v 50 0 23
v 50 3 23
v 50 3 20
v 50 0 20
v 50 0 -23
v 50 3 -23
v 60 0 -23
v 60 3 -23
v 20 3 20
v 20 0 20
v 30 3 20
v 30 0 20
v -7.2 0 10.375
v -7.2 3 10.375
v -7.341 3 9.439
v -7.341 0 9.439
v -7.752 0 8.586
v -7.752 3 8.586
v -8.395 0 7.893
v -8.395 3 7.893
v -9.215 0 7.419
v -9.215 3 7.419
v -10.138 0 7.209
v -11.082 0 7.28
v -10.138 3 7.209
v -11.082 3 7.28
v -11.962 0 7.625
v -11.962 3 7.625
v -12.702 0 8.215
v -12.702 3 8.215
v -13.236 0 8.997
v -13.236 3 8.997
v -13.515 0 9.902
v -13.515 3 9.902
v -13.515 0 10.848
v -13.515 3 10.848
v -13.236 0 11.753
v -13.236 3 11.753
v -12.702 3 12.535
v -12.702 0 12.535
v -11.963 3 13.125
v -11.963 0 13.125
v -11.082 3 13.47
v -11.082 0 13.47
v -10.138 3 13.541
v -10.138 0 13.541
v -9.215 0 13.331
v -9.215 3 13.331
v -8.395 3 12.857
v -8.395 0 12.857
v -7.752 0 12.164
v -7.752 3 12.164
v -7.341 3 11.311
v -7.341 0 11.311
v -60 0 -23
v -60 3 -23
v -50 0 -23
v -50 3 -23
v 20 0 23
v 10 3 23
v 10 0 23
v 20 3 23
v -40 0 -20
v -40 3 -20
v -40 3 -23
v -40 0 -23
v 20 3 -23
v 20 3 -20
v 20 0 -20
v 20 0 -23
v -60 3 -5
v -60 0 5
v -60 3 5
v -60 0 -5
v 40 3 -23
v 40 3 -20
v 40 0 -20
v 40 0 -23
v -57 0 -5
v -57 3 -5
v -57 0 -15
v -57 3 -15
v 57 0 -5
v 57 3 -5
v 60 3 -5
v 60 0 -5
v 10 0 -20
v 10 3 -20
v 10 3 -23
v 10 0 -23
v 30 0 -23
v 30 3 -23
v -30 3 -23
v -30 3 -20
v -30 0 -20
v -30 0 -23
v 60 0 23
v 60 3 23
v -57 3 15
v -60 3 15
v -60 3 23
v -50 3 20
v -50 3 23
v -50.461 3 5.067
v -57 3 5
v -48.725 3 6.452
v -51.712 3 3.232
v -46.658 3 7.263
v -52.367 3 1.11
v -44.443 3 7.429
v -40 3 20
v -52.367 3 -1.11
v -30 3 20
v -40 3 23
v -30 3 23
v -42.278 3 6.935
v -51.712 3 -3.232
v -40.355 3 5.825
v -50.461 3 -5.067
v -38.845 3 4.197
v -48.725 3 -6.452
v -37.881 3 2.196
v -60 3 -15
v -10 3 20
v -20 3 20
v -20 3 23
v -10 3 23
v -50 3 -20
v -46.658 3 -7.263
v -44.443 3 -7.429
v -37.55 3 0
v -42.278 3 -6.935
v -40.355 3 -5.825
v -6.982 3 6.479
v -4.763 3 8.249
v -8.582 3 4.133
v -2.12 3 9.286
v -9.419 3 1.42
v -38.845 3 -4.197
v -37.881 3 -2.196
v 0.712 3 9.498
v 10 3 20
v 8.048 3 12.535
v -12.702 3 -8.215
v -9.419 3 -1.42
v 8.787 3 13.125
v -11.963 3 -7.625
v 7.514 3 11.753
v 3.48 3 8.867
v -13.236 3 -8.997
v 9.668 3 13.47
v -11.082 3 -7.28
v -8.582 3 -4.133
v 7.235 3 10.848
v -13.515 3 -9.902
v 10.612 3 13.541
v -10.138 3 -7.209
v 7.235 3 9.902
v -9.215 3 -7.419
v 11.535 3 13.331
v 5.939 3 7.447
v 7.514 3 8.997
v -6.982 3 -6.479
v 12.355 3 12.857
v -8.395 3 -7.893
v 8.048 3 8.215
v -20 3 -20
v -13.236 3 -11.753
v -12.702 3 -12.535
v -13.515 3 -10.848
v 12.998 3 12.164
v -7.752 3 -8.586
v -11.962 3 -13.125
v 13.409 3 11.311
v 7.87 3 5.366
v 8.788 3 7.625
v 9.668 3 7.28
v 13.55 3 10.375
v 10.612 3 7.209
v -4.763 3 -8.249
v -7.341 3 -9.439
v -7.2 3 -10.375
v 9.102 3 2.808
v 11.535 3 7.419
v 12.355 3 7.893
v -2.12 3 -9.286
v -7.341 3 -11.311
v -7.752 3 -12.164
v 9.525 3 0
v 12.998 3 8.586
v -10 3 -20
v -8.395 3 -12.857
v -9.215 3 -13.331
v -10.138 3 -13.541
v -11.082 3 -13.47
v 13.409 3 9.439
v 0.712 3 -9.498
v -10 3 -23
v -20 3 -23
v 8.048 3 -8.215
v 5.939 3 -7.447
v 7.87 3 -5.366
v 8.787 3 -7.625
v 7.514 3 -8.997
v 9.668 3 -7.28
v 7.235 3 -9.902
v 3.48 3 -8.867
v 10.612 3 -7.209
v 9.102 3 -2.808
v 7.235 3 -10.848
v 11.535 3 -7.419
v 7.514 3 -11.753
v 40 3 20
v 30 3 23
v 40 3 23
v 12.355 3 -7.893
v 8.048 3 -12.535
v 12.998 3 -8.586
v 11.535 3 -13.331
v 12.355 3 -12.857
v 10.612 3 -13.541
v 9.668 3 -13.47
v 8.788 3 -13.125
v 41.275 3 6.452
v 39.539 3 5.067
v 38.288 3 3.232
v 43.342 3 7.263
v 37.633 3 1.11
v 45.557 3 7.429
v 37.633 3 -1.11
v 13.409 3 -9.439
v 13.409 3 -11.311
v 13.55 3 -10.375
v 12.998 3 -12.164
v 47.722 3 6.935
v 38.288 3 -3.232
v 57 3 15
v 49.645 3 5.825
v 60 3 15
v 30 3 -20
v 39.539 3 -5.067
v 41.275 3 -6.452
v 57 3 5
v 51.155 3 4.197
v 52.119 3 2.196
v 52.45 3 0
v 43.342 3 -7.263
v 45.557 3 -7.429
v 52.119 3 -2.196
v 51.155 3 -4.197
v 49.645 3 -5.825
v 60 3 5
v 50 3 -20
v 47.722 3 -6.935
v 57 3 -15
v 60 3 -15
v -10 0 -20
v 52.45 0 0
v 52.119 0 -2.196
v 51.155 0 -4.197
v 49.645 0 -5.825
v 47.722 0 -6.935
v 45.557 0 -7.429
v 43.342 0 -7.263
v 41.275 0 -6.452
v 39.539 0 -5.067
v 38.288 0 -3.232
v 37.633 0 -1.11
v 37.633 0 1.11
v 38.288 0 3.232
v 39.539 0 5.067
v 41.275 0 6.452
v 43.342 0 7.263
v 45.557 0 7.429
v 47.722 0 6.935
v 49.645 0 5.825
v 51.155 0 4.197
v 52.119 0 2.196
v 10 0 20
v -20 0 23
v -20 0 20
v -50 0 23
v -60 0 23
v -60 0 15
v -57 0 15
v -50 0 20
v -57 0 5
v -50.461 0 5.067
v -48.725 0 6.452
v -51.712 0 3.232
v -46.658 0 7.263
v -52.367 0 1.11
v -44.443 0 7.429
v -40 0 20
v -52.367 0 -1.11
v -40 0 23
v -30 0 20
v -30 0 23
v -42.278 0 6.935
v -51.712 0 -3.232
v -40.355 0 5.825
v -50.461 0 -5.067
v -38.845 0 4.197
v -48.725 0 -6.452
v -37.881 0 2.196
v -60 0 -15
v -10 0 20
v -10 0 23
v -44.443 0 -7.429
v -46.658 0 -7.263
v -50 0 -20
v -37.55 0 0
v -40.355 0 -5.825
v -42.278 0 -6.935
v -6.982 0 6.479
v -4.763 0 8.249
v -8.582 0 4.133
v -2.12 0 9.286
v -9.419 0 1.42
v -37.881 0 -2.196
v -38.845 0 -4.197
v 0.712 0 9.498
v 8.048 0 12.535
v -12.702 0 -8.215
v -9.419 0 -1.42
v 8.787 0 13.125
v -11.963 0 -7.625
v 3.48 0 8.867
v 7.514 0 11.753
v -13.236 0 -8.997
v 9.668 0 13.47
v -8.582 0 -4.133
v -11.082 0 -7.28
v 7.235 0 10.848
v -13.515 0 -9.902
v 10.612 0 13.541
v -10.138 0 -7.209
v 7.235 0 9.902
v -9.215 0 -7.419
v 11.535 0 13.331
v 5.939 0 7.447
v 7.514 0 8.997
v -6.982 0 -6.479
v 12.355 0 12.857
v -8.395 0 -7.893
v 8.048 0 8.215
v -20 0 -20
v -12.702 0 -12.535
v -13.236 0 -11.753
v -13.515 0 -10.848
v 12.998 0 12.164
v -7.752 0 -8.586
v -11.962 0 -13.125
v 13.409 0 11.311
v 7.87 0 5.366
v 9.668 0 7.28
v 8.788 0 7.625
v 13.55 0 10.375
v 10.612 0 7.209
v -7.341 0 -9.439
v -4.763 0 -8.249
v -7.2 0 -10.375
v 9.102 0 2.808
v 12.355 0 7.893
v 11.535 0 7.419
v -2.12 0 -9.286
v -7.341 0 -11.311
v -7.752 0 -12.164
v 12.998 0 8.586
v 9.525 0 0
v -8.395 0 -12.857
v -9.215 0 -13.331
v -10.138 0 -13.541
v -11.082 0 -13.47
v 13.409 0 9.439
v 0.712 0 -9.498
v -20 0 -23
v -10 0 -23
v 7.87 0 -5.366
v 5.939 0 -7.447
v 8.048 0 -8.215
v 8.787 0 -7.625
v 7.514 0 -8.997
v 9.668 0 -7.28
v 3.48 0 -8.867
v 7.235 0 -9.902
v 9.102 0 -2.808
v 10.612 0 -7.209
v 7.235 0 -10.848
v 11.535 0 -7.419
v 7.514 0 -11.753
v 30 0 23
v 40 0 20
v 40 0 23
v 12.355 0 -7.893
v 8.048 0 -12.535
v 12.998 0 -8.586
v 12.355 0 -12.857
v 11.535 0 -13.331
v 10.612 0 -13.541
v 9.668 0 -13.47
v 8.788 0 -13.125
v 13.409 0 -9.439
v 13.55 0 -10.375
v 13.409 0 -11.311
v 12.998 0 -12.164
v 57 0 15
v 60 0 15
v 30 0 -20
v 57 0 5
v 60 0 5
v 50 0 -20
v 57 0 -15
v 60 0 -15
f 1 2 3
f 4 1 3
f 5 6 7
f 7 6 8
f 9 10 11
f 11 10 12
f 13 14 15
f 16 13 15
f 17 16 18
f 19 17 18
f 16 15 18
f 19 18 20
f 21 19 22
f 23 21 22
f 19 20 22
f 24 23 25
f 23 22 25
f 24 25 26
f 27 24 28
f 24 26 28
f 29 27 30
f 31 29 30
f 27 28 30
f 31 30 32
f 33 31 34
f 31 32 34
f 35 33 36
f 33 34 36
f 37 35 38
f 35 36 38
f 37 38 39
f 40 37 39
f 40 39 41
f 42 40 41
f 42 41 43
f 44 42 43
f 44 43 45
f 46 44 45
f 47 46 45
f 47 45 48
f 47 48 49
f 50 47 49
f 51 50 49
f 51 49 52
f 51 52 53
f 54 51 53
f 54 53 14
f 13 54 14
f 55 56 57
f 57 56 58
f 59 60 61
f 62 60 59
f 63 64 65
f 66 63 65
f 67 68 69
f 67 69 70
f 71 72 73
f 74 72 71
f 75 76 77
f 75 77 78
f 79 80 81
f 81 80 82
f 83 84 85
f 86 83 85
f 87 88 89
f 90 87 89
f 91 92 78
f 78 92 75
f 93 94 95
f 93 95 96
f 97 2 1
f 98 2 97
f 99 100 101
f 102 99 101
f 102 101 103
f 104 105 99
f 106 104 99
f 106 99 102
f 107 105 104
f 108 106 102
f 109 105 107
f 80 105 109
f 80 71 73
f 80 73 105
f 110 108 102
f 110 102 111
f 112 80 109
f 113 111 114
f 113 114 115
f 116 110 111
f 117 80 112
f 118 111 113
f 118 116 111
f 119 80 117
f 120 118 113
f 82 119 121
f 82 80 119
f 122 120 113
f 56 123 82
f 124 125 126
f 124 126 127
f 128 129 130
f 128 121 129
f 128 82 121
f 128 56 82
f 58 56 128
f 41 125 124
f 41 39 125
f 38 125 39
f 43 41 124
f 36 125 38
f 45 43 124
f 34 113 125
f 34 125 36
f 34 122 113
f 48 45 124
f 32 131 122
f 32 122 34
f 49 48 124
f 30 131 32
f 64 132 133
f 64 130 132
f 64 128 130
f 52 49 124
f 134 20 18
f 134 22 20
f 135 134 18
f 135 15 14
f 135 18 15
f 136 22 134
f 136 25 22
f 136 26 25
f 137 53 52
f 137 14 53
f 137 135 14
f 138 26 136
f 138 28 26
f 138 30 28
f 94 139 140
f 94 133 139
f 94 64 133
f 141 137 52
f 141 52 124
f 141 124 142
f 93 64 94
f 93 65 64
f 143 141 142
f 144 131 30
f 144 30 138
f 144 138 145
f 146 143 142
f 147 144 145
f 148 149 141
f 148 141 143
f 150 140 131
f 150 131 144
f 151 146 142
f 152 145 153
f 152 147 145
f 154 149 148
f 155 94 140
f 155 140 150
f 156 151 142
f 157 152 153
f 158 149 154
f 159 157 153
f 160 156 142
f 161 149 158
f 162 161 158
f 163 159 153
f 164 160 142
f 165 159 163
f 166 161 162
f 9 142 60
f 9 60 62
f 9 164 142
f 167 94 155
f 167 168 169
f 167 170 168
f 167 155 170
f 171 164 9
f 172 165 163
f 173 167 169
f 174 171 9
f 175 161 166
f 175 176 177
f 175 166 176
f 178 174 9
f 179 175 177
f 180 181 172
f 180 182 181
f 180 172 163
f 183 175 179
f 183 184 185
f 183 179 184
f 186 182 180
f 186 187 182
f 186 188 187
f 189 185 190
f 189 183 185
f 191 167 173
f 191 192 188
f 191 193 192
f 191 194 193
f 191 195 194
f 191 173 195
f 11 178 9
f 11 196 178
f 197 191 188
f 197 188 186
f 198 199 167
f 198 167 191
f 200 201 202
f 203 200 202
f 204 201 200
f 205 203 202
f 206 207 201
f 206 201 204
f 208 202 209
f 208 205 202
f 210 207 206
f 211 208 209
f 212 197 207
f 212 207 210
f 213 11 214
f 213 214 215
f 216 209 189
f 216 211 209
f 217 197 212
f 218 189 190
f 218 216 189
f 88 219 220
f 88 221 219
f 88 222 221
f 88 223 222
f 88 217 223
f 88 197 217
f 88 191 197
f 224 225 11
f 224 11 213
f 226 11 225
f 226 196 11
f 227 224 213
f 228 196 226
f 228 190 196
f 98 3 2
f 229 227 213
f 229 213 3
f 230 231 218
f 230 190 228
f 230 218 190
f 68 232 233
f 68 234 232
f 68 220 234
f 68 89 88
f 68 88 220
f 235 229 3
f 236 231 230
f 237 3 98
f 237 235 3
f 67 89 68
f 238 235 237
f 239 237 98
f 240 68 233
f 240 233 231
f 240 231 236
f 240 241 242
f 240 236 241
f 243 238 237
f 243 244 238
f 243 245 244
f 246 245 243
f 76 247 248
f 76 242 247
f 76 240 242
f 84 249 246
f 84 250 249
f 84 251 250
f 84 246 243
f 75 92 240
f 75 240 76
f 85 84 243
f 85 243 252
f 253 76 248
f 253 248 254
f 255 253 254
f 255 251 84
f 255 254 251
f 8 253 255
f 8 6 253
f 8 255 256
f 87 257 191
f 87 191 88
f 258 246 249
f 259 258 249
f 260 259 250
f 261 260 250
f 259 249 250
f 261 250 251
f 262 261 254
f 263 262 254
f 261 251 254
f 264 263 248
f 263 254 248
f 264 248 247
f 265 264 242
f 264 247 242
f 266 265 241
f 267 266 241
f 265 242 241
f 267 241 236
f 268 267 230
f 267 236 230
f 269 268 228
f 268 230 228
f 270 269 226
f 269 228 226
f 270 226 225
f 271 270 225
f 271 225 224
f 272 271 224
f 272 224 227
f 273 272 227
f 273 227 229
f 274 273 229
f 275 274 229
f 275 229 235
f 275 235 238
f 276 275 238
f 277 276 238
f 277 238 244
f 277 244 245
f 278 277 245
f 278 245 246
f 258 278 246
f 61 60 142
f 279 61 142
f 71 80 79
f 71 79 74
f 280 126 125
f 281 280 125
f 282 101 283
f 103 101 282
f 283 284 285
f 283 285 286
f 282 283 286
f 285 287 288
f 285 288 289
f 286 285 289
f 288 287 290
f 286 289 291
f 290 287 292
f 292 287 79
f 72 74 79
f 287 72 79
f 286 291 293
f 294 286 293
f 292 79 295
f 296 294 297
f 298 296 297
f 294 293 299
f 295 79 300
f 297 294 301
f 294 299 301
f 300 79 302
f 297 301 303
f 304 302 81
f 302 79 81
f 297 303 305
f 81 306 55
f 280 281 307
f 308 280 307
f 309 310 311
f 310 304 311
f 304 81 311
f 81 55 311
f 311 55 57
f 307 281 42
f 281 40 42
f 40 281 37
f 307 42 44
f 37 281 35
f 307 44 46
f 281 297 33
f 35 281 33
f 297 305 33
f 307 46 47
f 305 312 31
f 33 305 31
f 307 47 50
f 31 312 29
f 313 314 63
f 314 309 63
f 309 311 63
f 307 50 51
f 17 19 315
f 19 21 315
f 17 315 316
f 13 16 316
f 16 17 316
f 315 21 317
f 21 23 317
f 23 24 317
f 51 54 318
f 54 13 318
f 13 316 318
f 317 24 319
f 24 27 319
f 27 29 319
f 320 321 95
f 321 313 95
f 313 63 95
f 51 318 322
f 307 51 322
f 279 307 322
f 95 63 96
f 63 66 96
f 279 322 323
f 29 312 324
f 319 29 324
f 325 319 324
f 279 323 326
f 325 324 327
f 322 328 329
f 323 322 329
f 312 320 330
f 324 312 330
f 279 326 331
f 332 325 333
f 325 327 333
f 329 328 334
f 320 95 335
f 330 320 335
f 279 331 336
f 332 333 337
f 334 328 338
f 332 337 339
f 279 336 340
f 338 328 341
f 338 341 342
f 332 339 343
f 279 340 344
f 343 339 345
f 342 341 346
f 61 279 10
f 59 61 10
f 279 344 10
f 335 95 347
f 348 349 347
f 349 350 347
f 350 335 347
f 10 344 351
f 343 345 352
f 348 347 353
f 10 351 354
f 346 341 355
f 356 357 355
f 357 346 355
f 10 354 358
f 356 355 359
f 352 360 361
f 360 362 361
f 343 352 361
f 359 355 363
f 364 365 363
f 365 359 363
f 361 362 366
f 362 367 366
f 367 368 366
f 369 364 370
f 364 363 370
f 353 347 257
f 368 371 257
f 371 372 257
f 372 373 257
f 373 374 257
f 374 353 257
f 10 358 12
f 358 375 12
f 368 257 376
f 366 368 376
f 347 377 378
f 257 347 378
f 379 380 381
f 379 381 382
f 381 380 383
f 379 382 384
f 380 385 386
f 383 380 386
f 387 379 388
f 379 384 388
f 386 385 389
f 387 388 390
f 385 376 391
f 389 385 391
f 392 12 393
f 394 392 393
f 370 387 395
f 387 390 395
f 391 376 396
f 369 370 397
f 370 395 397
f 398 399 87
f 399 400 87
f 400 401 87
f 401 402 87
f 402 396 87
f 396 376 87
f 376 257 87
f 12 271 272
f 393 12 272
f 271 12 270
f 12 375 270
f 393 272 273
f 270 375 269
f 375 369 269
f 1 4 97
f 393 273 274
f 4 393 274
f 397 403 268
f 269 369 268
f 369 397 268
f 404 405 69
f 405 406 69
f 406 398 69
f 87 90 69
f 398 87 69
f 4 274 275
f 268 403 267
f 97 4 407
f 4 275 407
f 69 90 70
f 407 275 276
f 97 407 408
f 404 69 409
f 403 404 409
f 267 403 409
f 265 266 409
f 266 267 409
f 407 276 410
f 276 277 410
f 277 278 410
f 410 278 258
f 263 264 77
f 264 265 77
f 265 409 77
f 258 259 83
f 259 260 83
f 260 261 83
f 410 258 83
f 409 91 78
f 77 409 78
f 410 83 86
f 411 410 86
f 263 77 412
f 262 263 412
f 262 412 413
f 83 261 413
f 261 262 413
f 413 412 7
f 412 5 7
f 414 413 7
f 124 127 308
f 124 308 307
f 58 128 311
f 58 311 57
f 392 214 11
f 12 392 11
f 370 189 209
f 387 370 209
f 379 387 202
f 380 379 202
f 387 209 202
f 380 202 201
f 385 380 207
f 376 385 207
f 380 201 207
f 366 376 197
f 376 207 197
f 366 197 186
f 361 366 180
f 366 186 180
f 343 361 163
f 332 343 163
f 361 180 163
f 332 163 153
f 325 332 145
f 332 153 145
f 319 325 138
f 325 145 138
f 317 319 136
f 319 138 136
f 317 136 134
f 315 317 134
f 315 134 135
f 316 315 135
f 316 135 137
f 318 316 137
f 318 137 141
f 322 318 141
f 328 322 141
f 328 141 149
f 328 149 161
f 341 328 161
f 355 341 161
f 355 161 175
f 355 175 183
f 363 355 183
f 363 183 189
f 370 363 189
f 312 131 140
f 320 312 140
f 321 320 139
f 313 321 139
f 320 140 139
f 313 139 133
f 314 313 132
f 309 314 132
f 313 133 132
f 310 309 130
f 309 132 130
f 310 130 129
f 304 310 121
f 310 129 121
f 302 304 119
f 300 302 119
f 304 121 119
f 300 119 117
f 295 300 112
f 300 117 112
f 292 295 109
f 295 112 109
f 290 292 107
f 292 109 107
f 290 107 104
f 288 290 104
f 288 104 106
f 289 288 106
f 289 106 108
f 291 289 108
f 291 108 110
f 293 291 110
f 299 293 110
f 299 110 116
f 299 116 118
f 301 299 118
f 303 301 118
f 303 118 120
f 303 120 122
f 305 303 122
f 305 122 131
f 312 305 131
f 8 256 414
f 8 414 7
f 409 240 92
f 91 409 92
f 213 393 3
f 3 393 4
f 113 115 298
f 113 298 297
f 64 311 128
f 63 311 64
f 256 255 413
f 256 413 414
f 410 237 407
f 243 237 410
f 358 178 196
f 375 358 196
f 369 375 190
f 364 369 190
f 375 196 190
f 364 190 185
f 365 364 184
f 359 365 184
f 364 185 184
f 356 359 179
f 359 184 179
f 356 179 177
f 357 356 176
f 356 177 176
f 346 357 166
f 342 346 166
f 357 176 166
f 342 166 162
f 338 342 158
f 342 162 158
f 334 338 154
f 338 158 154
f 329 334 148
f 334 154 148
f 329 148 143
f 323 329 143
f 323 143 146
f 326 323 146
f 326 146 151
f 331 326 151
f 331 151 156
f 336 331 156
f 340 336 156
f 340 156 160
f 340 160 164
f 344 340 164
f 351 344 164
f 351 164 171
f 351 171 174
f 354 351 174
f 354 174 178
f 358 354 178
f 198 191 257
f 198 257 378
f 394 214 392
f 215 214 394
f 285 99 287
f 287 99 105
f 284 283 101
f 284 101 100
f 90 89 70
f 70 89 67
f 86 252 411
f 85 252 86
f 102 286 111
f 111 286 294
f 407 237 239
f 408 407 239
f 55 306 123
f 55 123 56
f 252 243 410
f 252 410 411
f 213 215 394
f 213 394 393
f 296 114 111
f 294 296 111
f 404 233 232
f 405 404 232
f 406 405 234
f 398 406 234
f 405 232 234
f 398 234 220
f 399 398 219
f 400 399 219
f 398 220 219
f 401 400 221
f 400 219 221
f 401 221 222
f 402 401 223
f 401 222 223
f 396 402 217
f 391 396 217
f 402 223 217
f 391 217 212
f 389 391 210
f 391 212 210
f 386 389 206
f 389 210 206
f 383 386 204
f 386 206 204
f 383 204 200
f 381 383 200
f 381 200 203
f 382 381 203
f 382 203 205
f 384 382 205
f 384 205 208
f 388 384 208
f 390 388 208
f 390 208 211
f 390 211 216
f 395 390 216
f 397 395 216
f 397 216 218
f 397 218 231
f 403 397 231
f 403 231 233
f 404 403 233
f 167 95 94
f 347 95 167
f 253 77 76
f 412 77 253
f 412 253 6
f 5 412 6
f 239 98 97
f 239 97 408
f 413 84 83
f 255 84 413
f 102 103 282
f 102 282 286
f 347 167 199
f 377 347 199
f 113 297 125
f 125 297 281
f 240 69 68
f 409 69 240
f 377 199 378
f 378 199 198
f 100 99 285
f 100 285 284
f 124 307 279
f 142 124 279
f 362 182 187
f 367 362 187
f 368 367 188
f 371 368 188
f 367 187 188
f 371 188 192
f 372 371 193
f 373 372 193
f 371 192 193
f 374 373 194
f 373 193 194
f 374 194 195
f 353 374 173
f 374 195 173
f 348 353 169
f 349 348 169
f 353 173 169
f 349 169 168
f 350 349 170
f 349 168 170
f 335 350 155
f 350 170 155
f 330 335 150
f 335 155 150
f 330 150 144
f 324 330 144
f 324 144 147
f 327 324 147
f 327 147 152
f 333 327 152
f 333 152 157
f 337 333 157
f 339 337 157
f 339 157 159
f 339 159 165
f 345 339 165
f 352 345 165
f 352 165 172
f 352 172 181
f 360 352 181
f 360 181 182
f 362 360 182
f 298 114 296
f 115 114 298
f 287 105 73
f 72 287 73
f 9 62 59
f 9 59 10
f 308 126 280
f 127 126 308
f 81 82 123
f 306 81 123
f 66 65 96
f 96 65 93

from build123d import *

# Parameters (mm, degrees)
SKETCH1_W           = 120
SKETCH1_H           = 40
BOSS_EXTRUDE1_DEPTH = 3
SKETCH2_R           = 7.45
SKETCH2_R_2         = 9.525
SKETCH2_R_3         = 3.175
CUT_EXTRUDE1_DEPTH  = 4
SKETCH4_W           = 10
SKETCH4_H           = 3
BOSS_EXTRUDE2_DEPTH = 3
SKETCH5_W           = 3
SKETCH5_H           = 10
CUT_EXTRUDE2_DEPTH  = 4


with BuildPart() as part:
    # Sketch1 → Boss-Extrude1 (new body)
    with BuildSketch(Plane(origin=(0, 0, 0), x_dir=(1, 0, 0), z_dir=(0, 1, 0))):
        Rectangle(SKETCH1_W, SKETCH1_H)
    extrude(amount=BOSS_EXTRUDE1_DEPTH)

    # Sketch2 → Cut-Extrude1 (cut, through all)
    with BuildSketch(Plane(origin=(0, 3, 0), x_dir=(1, 0, 0), z_dir=(0, 1, 0))):
        with Locations((45, 0)):
            Circle(SKETCH2_R)
        with Locations((-45, 0)):
            Circle(SKETCH2_R)
        Circle(SKETCH2_R_2)
        with Locations((10.375, 10.375)):
            Circle(SKETCH2_R_3)
        with Locations((10.375, -10.375)):
            Circle(SKETCH2_R_3)
        with Locations((-10.375, -10.375)):
            Circle(SKETCH2_R_3)
        with Locations((-10.375, 10.375)):
            Circle(SKETCH2_R_3)
    extrude(amount=-CUT_EXTRUDE1_DEPTH, mode=Mode.SUBTRACT)

    # Sketch4 → Boss-Extrude2 (add)
    with BuildSketch(Plane(origin=(0, 3, 0), x_dir=(1, 0, 0), z_dir=(0, 1, 0))):
        with Locations((15, 21.5)):
            Rectangle(SKETCH4_W, SKETCH4_H)
        with Locations((35, 21.5)):
            Rectangle(SKETCH4_W, SKETCH4_H)
        with Locations((55, 21.5)):
            Rectangle(SKETCH4_W, SKETCH4_H)
        with Locations((-55, 21.5)):
            Rectangle(SKETCH4_W, SKETCH4_H)
        with Locations((-35, 21.5)):
            Rectangle(SKETCH4_W, SKETCH4_H)
        with Locations((-15, 21.5)):
            Rectangle(SKETCH4_W, SKETCH4_H)
        with Locations((-15, -21.5)):
            Rectangle(SKETCH4_W, SKETCH4_H)
        with Locations((-35, -21.5)):
            Rectangle(SKETCH4_W, SKETCH4_H)
        with Locations((-55, -21.5)):
            Rectangle(SKETCH4_W, SKETCH4_H)
        with Locations((55, -21.5)):
            Rectangle(SKETCH4_W, SKETCH4_H)
        with Locations((35, -21.5)):
            Rectangle(SKETCH4_W, SKETCH4_H)
        with Locations((15, -21.5)):
            Rectangle(SKETCH4_W, SKETCH4_H)
    extrude(amount=-BOSS_EXTRUDE2_DEPTH)

    # Sketch5 → Cut-Extrude2 (cut, through all)
    with BuildSketch(Plane(origin=(0, 3, 0), x_dir=(1, 0, 0), z_dir=(0, 1, 0))):
        with Locations((58.5, 10)):
            Rectangle(SKETCH5_W, SKETCH5_H)
        with Locations((58.5, -10)):
            Rectangle(SKETCH5_W, SKETCH5_H)
    cut_extrude2 = extrude(amount=-CUT_EXTRUDE2_DEPTH, mode=Mode.SUBTRACT)

    # Mirror1: Cut-Extrude2 across plane
    add(cut_extrude2.mirror(Plane(origin=(0, 0, 0), x_dir=(0, 0, 1), z_dir=(1, 0, 0))), mode=Mode.SUBTRACT)


solid = part.part
